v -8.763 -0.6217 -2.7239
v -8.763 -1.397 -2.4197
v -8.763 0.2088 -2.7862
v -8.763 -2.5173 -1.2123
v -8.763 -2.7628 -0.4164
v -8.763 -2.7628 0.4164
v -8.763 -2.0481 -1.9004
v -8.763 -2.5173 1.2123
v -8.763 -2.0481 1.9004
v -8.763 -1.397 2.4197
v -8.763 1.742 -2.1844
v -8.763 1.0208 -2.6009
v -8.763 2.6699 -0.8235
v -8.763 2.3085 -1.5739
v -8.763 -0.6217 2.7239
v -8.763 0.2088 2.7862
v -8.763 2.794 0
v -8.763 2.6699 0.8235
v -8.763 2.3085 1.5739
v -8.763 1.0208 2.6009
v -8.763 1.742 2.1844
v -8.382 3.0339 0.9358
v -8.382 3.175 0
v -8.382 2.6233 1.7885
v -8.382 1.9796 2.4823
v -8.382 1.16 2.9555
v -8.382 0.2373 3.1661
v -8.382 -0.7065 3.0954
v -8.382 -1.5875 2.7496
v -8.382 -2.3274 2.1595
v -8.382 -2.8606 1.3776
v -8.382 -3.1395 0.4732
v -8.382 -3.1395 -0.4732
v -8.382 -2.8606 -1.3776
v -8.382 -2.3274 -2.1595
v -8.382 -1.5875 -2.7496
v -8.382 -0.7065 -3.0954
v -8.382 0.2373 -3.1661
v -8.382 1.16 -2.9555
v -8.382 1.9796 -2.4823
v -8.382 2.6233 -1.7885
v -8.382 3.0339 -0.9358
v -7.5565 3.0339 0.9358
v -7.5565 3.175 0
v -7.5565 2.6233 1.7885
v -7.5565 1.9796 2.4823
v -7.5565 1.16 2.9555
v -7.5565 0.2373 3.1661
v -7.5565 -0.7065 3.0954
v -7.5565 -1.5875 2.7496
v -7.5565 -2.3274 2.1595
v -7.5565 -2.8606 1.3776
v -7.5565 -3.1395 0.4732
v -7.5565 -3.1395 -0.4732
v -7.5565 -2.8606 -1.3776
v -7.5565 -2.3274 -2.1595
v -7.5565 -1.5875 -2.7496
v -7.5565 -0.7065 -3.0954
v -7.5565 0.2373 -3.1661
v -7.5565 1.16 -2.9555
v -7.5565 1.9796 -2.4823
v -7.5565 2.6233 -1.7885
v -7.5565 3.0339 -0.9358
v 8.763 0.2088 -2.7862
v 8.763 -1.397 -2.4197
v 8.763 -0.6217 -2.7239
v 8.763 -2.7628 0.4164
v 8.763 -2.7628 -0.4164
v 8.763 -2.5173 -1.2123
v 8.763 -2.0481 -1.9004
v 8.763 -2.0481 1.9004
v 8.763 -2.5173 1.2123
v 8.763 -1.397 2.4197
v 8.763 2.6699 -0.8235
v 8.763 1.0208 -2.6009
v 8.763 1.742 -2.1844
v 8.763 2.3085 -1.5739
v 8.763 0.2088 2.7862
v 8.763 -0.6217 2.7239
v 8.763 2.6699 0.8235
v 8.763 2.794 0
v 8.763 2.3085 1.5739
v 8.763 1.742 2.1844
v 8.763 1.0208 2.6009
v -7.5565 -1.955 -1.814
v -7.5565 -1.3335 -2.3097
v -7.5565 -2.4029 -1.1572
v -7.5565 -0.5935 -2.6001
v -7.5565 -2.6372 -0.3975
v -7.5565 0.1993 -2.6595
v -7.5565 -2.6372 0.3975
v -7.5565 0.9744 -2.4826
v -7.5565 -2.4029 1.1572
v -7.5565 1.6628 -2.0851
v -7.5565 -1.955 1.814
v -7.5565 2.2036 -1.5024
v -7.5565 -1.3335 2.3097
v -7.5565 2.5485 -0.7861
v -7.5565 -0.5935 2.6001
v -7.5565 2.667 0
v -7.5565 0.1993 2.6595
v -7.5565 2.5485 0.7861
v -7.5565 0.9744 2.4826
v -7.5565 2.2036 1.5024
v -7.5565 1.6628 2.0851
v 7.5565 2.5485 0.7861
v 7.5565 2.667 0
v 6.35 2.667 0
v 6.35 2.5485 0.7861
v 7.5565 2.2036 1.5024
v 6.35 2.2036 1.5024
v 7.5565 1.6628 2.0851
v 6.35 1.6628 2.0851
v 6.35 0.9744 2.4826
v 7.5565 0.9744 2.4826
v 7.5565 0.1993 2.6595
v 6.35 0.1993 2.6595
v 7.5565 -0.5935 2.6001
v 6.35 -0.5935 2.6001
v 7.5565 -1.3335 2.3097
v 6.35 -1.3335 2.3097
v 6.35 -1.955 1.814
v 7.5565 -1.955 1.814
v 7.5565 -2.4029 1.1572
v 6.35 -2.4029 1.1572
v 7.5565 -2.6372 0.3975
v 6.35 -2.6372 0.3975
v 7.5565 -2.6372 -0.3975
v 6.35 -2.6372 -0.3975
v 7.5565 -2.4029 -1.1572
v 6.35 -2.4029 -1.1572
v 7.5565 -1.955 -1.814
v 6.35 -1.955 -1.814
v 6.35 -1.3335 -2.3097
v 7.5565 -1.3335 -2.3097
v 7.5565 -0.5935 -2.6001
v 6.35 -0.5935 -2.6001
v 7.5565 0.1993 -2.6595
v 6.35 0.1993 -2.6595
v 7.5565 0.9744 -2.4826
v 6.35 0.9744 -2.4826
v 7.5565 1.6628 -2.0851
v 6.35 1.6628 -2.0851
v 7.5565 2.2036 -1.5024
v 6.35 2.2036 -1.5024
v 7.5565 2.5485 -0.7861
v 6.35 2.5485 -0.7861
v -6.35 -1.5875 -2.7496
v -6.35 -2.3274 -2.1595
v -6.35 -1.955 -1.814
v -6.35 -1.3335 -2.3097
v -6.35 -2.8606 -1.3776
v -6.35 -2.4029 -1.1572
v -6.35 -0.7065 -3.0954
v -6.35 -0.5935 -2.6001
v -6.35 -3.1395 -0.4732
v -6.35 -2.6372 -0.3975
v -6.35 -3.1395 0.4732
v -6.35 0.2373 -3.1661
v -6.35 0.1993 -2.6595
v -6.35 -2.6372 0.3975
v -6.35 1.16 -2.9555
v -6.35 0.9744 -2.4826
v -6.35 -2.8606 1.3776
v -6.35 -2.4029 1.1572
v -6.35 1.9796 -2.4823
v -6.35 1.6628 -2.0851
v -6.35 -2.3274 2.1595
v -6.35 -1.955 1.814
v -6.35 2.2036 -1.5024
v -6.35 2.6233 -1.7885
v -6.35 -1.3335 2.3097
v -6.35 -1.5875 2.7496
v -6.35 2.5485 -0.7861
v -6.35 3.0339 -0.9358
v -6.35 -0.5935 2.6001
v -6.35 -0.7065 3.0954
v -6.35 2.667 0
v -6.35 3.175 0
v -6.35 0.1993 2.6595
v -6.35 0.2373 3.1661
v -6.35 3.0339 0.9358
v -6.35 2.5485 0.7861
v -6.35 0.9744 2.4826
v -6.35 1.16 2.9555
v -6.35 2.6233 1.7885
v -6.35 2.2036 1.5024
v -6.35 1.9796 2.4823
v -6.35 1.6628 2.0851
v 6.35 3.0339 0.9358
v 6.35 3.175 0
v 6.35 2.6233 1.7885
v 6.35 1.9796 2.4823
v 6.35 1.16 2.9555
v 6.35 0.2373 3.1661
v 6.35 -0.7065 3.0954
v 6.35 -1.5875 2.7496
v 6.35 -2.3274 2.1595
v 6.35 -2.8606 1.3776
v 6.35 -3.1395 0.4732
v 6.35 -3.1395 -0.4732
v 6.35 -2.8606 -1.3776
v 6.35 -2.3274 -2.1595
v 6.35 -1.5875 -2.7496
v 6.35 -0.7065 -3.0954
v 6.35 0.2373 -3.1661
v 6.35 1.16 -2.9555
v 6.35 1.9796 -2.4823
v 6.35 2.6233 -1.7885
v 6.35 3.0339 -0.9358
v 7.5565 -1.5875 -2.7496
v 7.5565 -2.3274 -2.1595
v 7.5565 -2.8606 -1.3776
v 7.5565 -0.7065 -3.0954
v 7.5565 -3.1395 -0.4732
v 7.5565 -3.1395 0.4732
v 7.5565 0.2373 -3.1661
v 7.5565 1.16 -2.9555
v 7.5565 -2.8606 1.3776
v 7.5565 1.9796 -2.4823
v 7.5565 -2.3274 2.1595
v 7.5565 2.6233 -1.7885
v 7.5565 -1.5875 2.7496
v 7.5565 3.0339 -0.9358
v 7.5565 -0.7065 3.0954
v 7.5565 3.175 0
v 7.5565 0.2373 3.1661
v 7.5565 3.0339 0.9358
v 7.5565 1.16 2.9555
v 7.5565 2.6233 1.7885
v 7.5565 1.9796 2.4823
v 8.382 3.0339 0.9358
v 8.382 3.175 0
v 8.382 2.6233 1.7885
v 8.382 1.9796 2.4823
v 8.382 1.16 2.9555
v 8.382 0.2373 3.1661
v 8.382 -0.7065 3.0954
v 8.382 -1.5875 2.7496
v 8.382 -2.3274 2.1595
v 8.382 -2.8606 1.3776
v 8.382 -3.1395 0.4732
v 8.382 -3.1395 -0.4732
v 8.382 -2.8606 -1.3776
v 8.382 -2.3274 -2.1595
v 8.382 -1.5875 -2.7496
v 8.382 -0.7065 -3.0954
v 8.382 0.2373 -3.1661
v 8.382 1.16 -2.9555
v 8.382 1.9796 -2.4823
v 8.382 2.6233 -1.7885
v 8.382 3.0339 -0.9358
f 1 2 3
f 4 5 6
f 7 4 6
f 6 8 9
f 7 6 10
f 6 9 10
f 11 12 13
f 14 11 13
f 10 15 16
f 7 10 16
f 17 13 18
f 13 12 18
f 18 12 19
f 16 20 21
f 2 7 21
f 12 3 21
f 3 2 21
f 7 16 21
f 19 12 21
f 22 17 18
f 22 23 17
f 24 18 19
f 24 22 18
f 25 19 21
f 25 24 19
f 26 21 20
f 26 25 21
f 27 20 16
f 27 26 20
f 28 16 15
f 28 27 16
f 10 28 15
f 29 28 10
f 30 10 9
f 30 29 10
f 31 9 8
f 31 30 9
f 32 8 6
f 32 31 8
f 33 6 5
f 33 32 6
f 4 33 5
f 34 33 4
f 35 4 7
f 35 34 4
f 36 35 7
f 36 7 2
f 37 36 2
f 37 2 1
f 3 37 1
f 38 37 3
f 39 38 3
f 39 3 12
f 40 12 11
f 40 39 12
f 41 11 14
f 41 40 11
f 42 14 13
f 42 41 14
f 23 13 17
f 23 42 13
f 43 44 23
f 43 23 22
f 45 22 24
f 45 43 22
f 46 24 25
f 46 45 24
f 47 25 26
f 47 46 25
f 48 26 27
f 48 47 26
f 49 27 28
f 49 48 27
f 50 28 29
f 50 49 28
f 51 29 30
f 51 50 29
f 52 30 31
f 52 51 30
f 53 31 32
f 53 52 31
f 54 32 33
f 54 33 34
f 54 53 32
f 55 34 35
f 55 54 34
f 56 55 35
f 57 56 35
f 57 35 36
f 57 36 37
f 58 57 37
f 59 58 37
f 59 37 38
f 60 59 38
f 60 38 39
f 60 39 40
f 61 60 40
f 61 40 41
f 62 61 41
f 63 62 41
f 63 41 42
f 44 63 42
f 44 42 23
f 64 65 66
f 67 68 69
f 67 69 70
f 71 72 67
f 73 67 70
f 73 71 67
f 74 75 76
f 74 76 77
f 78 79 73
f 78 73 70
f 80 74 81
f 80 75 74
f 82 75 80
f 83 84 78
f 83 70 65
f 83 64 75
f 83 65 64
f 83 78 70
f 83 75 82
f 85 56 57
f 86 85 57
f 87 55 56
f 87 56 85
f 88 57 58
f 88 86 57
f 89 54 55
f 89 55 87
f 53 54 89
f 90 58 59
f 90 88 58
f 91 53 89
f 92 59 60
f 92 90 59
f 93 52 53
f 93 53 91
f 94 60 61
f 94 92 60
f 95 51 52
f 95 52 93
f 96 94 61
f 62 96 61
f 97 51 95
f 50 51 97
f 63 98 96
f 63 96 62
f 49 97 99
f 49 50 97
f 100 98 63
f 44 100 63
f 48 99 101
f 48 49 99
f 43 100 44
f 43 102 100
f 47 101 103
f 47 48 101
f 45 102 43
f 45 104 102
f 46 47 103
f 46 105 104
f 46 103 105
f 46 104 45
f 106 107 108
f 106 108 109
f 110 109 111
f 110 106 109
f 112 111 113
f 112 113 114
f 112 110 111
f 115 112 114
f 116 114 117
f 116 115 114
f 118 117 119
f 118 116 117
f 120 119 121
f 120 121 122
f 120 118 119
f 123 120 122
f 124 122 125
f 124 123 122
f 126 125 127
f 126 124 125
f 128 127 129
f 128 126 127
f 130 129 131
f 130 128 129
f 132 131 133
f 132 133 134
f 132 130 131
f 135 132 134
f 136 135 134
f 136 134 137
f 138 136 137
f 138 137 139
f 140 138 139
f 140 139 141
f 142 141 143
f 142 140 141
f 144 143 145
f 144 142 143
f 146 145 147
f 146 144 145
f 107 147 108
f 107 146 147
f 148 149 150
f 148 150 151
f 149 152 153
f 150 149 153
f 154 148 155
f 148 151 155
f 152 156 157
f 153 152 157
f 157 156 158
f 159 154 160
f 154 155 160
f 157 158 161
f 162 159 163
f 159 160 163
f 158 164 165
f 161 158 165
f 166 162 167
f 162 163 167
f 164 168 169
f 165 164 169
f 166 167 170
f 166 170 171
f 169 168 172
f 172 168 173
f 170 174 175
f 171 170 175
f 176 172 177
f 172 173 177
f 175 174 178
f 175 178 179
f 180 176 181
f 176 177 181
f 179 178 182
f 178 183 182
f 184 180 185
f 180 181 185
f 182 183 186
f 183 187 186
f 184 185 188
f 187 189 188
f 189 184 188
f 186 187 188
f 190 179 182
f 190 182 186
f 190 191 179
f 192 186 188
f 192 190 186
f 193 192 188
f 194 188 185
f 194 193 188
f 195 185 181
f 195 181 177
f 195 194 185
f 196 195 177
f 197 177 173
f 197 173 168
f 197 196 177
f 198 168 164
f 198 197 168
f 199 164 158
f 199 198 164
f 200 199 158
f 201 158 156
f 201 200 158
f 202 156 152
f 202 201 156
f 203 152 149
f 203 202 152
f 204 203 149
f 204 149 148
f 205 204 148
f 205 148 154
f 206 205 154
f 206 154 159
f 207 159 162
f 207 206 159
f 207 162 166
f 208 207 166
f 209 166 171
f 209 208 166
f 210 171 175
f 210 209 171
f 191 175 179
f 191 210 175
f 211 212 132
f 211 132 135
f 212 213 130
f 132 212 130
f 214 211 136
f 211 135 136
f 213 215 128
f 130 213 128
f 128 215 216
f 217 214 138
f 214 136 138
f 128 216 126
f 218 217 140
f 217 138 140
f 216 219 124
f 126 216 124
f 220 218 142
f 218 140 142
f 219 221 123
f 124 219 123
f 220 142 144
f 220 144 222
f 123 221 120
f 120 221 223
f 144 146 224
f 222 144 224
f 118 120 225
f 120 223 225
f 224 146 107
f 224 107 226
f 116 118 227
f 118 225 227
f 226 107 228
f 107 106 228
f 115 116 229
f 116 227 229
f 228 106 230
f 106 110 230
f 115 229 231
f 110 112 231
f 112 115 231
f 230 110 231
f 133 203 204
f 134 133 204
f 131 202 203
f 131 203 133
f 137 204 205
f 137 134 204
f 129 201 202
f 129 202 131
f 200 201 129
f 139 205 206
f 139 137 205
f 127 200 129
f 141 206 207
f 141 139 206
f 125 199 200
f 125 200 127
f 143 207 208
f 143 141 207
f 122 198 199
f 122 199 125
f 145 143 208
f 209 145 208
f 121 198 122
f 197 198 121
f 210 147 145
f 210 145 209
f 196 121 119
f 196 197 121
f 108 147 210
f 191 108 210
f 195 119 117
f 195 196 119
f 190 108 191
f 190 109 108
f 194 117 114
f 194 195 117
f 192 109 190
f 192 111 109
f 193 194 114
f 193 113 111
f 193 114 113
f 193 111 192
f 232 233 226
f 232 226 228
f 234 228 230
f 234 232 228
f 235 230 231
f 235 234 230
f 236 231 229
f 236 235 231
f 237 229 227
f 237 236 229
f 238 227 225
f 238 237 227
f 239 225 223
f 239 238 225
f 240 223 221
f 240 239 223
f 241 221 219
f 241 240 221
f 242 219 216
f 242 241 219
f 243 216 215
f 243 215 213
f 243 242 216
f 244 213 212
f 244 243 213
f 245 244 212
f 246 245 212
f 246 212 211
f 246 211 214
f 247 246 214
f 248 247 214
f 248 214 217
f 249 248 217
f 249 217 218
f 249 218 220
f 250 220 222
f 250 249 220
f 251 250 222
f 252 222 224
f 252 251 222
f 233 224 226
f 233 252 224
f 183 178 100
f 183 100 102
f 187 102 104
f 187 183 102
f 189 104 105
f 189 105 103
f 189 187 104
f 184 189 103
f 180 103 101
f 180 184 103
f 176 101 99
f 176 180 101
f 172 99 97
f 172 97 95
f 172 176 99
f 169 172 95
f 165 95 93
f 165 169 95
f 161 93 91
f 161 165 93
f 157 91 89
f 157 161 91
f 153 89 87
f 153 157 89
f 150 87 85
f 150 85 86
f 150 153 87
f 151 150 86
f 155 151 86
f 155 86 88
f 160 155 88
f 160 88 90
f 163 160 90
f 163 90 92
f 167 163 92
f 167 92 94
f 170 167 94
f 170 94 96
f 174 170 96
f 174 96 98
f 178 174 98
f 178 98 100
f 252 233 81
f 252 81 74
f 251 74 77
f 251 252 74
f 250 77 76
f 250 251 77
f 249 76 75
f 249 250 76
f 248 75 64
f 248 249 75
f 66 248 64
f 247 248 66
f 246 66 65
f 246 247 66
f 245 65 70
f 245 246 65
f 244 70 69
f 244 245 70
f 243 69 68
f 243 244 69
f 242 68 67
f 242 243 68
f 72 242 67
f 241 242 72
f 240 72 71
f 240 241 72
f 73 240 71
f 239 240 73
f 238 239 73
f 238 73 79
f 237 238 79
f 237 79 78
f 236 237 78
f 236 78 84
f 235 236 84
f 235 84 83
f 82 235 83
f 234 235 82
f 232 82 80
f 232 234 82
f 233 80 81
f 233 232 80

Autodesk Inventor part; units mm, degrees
sketch "Sketch_1" plane through (0, 0, 0) normal (0, 0, 1) x (1, 0, 0)
  line L0 (8.763, 0) -> (-8.763, 0)
  line L1 (-8.763, 0) -> (-8.763, 2.794)
  line L2 (-8.763, 2.794) -> (-8.382, 3.175)
  line L3 (-8.382, 3.175) -> (-7.5565, 3.175)
  line L4 (-7.5565, 3.175) -> (-7.5565, 2.667)
  line L5 (-7.5565, 2.667) -> (-6.35, 2.667)
  line L6 (-6.35, 2.667) -> (-6.35, 3.175)
  line L7 (-6.35, 3.175) -> (6.35, 3.175)
  line L8 (6.35, 3.175) -> (6.35, 2.667)
  line L9 (6.35, 2.667) -> (7.5565, 2.667)
  line L10 (7.5565, 2.667) -> (7.5565, 3.175)
  line L11 (7.5565, 3.175) -> (8.382, 3.175)
  line L12 (8.382, 3.175) -> (8.763, 2.794)
  line L13 (8.763, 2.794) -> (8.763, 0)
  line L14 (8.763, 0) -> (-8.763, 0)
revolve "Revolution1" add sketch "Sketch_1" angle 360 about axis through (8.763, 0, 0) along (1, 0, 0)
ref_plane "p1_XY" through (0, 0, 3.175) normal (1, 0, 0) x (0, 0, -1)
ref_plane "p1_YZ" through (0, 0, 3.175) normal (0, 0, -1) x (0, 1, 0)
ref_plane "p1_ZX" through (0, 0, 3.175) normal (0, 1, 0) x (1, 0, 0)
ref_plane "p2_XY" through (0, 0, -3.175) normal (1, 0, 0) x (0, 0, -1)
ref_plane "p2_YZ" through (0, 0, -3.175) normal (0, 0, -1) x (0, 1, 0)
ref_plane "p2_ZX" through (0, 0, -3.175) normal (0, 1, 0) x (1, 0, 0)
ref_plane "pin_XY" through (0, 0, 0) normal (1, 0, 0) x (0, 0, -1)
ref_plane "pin_YZ" through (0, 0, 0) normal (0, 0, -1) x (0, 1, 0)
ref_plane "pin_ZX" through (0, 0, 0) normal (0, 1, 0) x (1, 0, 0)
ref_plane "rr1_XY" through (6.9532, 0, 0) normal (1, 0, 0) x (0, 0, -1)
ref_plane "rr1_YZ" through (6.9532, 0, 0) normal (0, 0, -1) x (0, 1, 0)
ref_plane "rr1_ZX" through (6.9532, 0, 0) normal (0, 1, 0) x (1, 0, 0)
ref_plane "rr2_XY" through (-6.9532, 0, 0) normal (1, 0, 0) x (0, 0, -1)
ref_plane "rr2_YZ" through (-6.9532, 0, 0) normal (0, 0, -1) x (0, 1, 0)
ref_plane "rr2_ZX" through (-6.9532, 0, 0) normal (0, 1, 0) x (1, 0, 0)
ref_plane "w21_XY" through (8.763, 0, 0) normal (0, 1, 0) x (1, 0, 0)
ref_plane "w21_YZ" through (8.763, 0, 0) normal (1, 0, 0) x (0, 0, -1)
ref_plane "w21_ZX" through (8.763, 0, 0) normal (0, 0, -1) x (0, 1, 0)
ref_plane "w22_XY" through (-8.763, 0, 0) normal (0, 1, 0) x (1, 0, 0)
ref_plane "w22_YZ" through (-8.763, 0, 0) normal (1, 0, 0) x (0, 0, -1)
ref_plane "w22_ZX" through (-8.763, 0, 0) normal (0, 0, -1) x (0, 1, 0)
properties part number "D-8381" material "Aluminum 6061"
